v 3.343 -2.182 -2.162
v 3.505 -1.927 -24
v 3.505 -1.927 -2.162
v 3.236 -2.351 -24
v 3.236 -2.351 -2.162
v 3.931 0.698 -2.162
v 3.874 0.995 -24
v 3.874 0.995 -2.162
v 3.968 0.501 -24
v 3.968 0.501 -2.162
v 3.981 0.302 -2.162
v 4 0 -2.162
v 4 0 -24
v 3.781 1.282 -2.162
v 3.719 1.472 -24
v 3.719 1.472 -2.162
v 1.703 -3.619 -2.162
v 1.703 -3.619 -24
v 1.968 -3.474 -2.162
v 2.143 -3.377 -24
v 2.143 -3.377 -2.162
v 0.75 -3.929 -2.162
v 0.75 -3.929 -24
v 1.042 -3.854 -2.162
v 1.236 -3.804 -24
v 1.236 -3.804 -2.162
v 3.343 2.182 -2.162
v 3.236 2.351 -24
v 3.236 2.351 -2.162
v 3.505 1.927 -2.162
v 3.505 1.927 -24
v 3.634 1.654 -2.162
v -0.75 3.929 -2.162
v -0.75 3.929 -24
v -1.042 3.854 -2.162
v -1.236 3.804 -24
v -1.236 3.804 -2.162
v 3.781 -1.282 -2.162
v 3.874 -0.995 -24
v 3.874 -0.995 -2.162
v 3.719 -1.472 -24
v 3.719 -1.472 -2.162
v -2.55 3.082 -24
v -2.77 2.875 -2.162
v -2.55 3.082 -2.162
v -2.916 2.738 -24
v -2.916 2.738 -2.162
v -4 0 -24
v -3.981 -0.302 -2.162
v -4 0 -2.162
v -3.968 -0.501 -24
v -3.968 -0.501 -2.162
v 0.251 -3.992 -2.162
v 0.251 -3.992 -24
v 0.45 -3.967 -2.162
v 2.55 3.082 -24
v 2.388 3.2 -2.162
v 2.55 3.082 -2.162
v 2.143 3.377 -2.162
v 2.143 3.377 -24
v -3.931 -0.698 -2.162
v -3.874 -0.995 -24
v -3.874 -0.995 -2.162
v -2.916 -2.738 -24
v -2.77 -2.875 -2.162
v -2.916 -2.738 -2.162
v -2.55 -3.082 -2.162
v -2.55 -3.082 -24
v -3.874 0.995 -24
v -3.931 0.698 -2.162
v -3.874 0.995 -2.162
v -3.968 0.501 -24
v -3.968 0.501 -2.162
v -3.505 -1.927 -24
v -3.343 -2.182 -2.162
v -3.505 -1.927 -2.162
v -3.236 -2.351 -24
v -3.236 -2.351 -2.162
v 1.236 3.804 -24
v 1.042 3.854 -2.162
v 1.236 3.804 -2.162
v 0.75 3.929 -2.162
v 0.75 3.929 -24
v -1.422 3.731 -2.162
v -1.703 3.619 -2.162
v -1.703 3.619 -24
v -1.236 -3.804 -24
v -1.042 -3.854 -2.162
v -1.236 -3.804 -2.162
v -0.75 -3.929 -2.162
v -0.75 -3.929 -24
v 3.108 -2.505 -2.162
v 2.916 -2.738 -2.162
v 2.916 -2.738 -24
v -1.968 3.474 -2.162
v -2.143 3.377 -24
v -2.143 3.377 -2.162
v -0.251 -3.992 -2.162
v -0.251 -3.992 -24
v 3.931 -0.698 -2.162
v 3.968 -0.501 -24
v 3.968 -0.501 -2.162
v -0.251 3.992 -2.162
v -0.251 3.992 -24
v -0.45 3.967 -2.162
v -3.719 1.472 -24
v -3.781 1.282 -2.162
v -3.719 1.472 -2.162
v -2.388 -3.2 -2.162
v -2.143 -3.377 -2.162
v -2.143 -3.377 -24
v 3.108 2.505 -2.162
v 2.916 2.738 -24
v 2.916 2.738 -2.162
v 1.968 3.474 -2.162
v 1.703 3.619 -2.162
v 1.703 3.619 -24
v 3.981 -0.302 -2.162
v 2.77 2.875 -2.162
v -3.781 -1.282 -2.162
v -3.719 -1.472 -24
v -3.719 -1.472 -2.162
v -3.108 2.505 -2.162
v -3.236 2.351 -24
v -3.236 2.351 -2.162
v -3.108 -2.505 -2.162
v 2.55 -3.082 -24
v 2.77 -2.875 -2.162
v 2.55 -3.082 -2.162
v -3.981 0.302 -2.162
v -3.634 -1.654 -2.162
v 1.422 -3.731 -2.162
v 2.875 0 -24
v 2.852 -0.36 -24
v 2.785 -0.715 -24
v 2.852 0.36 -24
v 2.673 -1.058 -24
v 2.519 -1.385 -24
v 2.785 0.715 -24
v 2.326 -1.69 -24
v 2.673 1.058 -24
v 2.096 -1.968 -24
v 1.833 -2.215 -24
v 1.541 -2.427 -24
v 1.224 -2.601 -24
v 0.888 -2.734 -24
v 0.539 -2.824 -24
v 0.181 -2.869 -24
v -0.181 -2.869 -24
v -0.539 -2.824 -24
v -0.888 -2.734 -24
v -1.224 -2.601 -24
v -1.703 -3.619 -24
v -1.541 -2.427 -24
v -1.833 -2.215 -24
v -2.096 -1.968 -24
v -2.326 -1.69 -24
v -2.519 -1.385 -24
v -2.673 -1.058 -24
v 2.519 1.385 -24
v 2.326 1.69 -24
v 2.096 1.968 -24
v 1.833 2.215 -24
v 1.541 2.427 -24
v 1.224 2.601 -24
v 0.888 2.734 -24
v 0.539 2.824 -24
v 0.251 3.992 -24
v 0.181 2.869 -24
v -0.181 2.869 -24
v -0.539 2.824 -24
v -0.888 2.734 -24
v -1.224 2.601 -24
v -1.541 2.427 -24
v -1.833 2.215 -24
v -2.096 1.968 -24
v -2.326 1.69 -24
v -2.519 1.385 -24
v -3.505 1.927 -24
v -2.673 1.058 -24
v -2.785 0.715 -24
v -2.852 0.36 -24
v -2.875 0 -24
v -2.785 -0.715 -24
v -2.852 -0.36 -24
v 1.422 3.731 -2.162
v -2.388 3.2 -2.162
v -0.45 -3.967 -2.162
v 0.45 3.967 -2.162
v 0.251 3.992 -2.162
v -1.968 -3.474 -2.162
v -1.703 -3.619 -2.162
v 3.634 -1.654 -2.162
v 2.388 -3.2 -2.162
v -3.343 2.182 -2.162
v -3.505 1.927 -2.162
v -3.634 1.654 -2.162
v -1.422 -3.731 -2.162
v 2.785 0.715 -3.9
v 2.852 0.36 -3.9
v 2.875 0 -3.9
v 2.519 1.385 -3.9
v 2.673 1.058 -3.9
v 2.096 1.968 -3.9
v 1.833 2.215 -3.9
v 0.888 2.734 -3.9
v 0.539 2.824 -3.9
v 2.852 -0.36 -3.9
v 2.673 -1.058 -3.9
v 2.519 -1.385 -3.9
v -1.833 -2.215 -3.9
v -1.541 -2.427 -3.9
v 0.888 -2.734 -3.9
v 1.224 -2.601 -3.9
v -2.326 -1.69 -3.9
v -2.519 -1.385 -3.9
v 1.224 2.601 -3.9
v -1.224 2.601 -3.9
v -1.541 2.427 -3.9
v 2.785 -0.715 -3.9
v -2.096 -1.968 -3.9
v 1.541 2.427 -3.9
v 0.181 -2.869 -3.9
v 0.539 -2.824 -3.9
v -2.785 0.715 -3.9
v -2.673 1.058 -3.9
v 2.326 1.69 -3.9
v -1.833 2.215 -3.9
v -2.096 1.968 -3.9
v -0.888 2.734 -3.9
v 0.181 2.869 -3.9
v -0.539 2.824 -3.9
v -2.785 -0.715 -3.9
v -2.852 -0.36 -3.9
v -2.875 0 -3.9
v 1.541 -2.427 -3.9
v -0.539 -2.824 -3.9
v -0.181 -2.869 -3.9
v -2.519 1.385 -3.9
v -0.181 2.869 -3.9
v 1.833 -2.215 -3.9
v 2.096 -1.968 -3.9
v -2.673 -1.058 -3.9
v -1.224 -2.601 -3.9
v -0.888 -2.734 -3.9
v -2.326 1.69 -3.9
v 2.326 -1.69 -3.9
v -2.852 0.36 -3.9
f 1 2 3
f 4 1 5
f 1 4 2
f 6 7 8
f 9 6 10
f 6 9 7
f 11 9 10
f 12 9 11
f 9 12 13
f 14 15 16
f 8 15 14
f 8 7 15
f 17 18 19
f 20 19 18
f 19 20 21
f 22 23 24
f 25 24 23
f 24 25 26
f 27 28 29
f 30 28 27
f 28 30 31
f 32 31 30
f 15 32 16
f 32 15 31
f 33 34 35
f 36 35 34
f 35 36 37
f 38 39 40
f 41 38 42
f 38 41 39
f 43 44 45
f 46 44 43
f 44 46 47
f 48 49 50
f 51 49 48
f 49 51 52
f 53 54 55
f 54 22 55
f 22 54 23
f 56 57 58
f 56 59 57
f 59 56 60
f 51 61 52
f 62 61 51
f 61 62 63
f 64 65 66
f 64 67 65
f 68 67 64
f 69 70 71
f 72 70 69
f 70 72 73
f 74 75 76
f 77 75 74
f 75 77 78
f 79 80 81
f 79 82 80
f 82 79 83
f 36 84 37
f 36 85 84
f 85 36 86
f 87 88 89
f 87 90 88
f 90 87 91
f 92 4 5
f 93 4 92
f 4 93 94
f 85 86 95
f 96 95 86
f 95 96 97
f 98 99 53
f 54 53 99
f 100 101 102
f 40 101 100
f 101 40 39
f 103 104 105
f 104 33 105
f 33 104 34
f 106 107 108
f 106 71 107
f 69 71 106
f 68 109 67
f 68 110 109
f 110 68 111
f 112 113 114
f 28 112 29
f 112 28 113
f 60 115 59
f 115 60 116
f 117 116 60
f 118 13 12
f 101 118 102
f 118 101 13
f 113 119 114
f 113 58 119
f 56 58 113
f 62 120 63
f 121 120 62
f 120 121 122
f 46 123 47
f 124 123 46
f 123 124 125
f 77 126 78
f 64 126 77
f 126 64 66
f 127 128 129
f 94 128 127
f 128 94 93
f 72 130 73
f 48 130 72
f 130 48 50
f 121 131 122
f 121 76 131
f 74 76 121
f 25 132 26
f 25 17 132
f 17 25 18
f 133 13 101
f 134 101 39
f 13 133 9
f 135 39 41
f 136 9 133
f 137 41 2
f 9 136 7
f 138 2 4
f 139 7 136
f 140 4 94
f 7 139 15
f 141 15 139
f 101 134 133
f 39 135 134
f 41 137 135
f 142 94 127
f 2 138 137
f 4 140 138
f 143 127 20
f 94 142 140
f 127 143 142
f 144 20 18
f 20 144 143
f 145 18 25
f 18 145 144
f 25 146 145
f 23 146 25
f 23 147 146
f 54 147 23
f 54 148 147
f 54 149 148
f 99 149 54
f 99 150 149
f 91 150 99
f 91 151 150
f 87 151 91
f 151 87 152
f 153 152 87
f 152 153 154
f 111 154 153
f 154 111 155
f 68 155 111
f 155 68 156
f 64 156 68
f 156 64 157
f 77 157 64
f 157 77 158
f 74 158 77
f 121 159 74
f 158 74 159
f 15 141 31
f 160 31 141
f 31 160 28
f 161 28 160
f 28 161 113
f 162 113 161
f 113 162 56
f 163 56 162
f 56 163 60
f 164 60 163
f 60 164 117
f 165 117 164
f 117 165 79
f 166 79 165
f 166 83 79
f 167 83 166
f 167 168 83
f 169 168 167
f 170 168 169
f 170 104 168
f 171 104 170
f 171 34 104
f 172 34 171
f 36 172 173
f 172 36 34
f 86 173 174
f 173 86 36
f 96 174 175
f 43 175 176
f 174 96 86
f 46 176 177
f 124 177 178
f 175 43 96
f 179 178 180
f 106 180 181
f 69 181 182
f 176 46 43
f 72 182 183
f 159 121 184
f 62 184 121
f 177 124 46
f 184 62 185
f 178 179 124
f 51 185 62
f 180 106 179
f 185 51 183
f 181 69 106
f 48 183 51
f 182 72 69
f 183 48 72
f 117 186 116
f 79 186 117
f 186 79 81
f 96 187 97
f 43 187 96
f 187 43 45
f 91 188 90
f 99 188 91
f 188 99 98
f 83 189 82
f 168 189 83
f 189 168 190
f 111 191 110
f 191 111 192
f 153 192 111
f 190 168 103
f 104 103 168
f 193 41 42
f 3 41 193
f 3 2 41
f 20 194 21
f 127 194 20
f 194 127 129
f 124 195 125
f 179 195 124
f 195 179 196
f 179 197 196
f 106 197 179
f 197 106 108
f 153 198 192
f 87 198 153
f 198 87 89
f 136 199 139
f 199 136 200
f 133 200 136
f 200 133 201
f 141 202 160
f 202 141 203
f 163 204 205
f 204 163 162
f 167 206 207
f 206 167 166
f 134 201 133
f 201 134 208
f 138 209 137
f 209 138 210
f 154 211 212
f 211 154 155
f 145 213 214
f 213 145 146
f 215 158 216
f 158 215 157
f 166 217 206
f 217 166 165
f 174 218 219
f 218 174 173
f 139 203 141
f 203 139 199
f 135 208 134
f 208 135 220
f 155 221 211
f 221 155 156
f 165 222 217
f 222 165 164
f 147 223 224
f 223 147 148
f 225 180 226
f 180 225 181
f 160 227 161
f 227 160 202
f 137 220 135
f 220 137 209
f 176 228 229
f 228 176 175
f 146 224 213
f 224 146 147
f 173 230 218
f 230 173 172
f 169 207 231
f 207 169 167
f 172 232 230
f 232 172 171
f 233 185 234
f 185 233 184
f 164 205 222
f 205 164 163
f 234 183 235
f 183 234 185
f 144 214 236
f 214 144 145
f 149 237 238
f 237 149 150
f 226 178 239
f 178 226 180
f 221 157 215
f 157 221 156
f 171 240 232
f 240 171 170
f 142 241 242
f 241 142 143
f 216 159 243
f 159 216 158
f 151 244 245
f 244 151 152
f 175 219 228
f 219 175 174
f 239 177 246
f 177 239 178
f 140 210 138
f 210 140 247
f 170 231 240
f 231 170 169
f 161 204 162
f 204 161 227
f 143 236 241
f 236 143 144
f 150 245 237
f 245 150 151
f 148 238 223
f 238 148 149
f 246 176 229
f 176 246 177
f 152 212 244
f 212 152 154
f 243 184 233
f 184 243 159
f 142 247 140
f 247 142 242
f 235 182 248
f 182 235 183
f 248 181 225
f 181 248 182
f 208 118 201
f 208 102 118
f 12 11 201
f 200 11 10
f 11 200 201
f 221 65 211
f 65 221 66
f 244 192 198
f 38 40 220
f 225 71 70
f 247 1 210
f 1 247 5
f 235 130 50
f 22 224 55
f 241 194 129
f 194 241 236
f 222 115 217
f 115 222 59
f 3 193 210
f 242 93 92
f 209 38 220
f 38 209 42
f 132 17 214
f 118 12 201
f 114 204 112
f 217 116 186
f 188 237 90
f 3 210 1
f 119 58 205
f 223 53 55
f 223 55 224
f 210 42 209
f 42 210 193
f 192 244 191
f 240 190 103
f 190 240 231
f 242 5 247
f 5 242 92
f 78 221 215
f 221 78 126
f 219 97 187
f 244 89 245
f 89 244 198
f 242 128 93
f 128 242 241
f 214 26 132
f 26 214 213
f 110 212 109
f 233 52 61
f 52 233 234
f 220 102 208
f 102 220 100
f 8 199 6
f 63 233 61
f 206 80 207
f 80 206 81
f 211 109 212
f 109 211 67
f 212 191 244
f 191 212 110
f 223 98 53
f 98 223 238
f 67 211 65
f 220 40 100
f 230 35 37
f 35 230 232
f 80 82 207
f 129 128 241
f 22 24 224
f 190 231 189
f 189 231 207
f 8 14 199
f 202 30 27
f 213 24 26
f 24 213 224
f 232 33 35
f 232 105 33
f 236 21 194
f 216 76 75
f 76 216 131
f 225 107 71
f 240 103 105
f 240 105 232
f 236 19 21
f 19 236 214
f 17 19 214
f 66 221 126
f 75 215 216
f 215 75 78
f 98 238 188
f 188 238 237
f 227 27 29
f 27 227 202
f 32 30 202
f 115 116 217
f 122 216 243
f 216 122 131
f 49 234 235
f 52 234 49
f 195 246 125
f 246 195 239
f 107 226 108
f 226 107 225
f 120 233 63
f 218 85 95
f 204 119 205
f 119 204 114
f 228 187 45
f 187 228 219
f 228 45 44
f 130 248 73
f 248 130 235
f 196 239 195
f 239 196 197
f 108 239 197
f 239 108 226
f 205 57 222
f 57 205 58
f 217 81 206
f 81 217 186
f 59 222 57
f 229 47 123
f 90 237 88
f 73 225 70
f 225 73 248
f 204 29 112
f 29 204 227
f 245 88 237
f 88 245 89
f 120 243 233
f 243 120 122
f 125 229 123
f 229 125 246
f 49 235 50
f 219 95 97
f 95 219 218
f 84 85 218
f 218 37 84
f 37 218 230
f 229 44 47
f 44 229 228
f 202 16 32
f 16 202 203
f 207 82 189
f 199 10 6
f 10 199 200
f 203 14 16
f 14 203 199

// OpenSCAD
$fn = 50;

difference() {
	union() {
		translate(v = [0, 0, -24.0]) {
			cylinder(h = 27, r = 4.0);
		}
		#translate(v = [0, 0, -27.0]) {
			cylinder(h = 27, r = 2.875);
		}
	}
	union() {
		translate(v = [0, 0, 0]) {
			rotate(a = [0, 0, 0]) {
				difference() {
					union() {
						translate(v = [0, 0, -27.0]) {
							cylinder(h = 27, r = 2.6);
						}
						translate(v = [0, 0, -3.9]) {
							cylinder(h = 3.9, r1 = 2.875, r2 = 5.4);
						}
						translate(v = [0, 0, -27.0]) {
							cylinder(h = 27, r = 2.875);
						}
						translate(v = [0, 0, -27.0]) {
							cylinder(h = 27, r = 2.6);
						}
					}
					union();
				}
			}
		}
		#cylinder(h = 3, r = 5.0);
	}
}
